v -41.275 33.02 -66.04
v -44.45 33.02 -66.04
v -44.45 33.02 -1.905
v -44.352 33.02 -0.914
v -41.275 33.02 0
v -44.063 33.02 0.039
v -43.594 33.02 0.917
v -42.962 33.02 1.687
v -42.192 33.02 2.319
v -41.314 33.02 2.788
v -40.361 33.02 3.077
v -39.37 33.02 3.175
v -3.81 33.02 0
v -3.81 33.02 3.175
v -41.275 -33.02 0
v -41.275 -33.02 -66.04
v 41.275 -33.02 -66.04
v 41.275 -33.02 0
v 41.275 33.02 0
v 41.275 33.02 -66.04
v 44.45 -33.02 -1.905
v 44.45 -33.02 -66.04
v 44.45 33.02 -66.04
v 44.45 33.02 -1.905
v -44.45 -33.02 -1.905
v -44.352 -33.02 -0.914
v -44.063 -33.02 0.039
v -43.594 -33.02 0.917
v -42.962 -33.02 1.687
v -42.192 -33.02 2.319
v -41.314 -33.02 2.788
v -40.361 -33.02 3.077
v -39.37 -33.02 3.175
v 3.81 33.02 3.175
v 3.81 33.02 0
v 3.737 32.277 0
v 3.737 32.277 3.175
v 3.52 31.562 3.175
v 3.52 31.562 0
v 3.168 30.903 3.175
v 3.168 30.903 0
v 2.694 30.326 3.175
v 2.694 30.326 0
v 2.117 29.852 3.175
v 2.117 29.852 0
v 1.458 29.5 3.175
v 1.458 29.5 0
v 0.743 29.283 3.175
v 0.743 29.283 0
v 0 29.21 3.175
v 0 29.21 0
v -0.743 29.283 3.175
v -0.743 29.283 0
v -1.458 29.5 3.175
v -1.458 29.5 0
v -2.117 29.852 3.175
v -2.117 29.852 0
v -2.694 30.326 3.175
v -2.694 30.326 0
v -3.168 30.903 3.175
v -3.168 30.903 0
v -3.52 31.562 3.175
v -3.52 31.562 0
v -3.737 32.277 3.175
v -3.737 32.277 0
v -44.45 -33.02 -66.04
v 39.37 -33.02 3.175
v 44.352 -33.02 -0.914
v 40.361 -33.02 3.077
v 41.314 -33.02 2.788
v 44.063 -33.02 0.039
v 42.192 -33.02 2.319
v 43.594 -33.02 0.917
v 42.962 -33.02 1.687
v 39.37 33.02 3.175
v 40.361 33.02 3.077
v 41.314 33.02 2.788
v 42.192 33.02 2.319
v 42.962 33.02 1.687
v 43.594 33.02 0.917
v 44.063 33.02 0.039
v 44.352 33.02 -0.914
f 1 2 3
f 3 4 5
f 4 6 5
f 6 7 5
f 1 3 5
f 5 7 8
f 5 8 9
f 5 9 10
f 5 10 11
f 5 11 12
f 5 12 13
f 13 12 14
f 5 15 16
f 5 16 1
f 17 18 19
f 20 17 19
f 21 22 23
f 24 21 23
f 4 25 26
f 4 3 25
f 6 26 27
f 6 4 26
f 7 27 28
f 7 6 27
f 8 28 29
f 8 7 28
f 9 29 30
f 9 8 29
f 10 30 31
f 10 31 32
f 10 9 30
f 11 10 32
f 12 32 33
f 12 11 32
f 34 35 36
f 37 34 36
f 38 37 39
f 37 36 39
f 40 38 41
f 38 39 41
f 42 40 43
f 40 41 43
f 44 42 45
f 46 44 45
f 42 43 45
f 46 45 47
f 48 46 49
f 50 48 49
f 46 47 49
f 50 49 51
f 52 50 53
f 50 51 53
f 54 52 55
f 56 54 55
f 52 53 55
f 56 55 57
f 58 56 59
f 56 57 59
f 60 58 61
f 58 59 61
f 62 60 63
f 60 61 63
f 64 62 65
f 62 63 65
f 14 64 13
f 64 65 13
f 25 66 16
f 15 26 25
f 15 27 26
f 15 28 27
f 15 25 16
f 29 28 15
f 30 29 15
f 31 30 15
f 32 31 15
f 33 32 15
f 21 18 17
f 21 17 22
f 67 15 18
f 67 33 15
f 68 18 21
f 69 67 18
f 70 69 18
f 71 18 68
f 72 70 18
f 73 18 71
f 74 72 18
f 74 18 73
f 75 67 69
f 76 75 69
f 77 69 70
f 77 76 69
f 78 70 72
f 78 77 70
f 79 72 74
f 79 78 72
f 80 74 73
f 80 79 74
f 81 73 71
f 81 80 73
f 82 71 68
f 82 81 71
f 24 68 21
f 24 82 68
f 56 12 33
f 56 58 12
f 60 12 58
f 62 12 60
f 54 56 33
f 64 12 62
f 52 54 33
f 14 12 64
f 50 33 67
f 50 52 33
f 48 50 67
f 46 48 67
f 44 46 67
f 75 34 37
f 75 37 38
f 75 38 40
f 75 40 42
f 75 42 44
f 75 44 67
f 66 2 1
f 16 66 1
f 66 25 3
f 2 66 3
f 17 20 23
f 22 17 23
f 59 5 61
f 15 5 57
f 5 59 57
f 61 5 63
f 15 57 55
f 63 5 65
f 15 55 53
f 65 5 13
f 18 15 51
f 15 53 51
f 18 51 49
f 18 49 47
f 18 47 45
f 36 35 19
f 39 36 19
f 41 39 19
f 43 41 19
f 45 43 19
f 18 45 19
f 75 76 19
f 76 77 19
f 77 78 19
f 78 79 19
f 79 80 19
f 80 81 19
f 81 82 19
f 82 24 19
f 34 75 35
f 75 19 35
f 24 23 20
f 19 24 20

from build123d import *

# Parameters (mm, degrees)
F0_W     = 3.175
F0_H     = 66.04
F1_DEPTH = 3.175
F2_DEPTH = 66.04
F3_R     = 5.08


with BuildPart() as f1:
    # F0 (on Top) → F1 (new body)
    with BuildSketch(Plane.XY):
        with Locations((42.8625, 0)):
            Rectangle(F0_W, F0_H)
        with Locations((-42.8625, 0)):
            Rectangle(F0_W, F0_H)
        with BuildLine():
            Line((41.275, -33.02), (41.275, 33.02))
            Line((41.275, 33.02), (3.81, 33.02))
            ThreePointArc((3.81, 33.02), (0, 29.21), (-3.81, 33.02))
            Line((-3.81, 33.02), (-41.275, 33.02))
            Line((-41.275, 33.02), (-41.275, -33.02))
            Line((-41.275, -33.02), (41.275, -33.02))
        make_face()
    extrude(amount=F1_DEPTH)

    # F0 (on Top) → F2 (join)
    with BuildSketch(Plane.XY):
        with Locations((-42.8625, 0)):
            Rectangle(F0_W, F0_H)
        with Locations((42.8625, 0)):
            Rectangle(F0_W, F0_H)
    extrude(amount=-F2_DEPTH)

    # F3
    f3_edges = [f1.edges().sort_by_distance(p)[0] for p in [
        (-44.45, 0, 3.175),
        (44.45, 0, 3.175),
    ]]
    fillet(f3_edges, radius=F3_R)


solid = f1.part
